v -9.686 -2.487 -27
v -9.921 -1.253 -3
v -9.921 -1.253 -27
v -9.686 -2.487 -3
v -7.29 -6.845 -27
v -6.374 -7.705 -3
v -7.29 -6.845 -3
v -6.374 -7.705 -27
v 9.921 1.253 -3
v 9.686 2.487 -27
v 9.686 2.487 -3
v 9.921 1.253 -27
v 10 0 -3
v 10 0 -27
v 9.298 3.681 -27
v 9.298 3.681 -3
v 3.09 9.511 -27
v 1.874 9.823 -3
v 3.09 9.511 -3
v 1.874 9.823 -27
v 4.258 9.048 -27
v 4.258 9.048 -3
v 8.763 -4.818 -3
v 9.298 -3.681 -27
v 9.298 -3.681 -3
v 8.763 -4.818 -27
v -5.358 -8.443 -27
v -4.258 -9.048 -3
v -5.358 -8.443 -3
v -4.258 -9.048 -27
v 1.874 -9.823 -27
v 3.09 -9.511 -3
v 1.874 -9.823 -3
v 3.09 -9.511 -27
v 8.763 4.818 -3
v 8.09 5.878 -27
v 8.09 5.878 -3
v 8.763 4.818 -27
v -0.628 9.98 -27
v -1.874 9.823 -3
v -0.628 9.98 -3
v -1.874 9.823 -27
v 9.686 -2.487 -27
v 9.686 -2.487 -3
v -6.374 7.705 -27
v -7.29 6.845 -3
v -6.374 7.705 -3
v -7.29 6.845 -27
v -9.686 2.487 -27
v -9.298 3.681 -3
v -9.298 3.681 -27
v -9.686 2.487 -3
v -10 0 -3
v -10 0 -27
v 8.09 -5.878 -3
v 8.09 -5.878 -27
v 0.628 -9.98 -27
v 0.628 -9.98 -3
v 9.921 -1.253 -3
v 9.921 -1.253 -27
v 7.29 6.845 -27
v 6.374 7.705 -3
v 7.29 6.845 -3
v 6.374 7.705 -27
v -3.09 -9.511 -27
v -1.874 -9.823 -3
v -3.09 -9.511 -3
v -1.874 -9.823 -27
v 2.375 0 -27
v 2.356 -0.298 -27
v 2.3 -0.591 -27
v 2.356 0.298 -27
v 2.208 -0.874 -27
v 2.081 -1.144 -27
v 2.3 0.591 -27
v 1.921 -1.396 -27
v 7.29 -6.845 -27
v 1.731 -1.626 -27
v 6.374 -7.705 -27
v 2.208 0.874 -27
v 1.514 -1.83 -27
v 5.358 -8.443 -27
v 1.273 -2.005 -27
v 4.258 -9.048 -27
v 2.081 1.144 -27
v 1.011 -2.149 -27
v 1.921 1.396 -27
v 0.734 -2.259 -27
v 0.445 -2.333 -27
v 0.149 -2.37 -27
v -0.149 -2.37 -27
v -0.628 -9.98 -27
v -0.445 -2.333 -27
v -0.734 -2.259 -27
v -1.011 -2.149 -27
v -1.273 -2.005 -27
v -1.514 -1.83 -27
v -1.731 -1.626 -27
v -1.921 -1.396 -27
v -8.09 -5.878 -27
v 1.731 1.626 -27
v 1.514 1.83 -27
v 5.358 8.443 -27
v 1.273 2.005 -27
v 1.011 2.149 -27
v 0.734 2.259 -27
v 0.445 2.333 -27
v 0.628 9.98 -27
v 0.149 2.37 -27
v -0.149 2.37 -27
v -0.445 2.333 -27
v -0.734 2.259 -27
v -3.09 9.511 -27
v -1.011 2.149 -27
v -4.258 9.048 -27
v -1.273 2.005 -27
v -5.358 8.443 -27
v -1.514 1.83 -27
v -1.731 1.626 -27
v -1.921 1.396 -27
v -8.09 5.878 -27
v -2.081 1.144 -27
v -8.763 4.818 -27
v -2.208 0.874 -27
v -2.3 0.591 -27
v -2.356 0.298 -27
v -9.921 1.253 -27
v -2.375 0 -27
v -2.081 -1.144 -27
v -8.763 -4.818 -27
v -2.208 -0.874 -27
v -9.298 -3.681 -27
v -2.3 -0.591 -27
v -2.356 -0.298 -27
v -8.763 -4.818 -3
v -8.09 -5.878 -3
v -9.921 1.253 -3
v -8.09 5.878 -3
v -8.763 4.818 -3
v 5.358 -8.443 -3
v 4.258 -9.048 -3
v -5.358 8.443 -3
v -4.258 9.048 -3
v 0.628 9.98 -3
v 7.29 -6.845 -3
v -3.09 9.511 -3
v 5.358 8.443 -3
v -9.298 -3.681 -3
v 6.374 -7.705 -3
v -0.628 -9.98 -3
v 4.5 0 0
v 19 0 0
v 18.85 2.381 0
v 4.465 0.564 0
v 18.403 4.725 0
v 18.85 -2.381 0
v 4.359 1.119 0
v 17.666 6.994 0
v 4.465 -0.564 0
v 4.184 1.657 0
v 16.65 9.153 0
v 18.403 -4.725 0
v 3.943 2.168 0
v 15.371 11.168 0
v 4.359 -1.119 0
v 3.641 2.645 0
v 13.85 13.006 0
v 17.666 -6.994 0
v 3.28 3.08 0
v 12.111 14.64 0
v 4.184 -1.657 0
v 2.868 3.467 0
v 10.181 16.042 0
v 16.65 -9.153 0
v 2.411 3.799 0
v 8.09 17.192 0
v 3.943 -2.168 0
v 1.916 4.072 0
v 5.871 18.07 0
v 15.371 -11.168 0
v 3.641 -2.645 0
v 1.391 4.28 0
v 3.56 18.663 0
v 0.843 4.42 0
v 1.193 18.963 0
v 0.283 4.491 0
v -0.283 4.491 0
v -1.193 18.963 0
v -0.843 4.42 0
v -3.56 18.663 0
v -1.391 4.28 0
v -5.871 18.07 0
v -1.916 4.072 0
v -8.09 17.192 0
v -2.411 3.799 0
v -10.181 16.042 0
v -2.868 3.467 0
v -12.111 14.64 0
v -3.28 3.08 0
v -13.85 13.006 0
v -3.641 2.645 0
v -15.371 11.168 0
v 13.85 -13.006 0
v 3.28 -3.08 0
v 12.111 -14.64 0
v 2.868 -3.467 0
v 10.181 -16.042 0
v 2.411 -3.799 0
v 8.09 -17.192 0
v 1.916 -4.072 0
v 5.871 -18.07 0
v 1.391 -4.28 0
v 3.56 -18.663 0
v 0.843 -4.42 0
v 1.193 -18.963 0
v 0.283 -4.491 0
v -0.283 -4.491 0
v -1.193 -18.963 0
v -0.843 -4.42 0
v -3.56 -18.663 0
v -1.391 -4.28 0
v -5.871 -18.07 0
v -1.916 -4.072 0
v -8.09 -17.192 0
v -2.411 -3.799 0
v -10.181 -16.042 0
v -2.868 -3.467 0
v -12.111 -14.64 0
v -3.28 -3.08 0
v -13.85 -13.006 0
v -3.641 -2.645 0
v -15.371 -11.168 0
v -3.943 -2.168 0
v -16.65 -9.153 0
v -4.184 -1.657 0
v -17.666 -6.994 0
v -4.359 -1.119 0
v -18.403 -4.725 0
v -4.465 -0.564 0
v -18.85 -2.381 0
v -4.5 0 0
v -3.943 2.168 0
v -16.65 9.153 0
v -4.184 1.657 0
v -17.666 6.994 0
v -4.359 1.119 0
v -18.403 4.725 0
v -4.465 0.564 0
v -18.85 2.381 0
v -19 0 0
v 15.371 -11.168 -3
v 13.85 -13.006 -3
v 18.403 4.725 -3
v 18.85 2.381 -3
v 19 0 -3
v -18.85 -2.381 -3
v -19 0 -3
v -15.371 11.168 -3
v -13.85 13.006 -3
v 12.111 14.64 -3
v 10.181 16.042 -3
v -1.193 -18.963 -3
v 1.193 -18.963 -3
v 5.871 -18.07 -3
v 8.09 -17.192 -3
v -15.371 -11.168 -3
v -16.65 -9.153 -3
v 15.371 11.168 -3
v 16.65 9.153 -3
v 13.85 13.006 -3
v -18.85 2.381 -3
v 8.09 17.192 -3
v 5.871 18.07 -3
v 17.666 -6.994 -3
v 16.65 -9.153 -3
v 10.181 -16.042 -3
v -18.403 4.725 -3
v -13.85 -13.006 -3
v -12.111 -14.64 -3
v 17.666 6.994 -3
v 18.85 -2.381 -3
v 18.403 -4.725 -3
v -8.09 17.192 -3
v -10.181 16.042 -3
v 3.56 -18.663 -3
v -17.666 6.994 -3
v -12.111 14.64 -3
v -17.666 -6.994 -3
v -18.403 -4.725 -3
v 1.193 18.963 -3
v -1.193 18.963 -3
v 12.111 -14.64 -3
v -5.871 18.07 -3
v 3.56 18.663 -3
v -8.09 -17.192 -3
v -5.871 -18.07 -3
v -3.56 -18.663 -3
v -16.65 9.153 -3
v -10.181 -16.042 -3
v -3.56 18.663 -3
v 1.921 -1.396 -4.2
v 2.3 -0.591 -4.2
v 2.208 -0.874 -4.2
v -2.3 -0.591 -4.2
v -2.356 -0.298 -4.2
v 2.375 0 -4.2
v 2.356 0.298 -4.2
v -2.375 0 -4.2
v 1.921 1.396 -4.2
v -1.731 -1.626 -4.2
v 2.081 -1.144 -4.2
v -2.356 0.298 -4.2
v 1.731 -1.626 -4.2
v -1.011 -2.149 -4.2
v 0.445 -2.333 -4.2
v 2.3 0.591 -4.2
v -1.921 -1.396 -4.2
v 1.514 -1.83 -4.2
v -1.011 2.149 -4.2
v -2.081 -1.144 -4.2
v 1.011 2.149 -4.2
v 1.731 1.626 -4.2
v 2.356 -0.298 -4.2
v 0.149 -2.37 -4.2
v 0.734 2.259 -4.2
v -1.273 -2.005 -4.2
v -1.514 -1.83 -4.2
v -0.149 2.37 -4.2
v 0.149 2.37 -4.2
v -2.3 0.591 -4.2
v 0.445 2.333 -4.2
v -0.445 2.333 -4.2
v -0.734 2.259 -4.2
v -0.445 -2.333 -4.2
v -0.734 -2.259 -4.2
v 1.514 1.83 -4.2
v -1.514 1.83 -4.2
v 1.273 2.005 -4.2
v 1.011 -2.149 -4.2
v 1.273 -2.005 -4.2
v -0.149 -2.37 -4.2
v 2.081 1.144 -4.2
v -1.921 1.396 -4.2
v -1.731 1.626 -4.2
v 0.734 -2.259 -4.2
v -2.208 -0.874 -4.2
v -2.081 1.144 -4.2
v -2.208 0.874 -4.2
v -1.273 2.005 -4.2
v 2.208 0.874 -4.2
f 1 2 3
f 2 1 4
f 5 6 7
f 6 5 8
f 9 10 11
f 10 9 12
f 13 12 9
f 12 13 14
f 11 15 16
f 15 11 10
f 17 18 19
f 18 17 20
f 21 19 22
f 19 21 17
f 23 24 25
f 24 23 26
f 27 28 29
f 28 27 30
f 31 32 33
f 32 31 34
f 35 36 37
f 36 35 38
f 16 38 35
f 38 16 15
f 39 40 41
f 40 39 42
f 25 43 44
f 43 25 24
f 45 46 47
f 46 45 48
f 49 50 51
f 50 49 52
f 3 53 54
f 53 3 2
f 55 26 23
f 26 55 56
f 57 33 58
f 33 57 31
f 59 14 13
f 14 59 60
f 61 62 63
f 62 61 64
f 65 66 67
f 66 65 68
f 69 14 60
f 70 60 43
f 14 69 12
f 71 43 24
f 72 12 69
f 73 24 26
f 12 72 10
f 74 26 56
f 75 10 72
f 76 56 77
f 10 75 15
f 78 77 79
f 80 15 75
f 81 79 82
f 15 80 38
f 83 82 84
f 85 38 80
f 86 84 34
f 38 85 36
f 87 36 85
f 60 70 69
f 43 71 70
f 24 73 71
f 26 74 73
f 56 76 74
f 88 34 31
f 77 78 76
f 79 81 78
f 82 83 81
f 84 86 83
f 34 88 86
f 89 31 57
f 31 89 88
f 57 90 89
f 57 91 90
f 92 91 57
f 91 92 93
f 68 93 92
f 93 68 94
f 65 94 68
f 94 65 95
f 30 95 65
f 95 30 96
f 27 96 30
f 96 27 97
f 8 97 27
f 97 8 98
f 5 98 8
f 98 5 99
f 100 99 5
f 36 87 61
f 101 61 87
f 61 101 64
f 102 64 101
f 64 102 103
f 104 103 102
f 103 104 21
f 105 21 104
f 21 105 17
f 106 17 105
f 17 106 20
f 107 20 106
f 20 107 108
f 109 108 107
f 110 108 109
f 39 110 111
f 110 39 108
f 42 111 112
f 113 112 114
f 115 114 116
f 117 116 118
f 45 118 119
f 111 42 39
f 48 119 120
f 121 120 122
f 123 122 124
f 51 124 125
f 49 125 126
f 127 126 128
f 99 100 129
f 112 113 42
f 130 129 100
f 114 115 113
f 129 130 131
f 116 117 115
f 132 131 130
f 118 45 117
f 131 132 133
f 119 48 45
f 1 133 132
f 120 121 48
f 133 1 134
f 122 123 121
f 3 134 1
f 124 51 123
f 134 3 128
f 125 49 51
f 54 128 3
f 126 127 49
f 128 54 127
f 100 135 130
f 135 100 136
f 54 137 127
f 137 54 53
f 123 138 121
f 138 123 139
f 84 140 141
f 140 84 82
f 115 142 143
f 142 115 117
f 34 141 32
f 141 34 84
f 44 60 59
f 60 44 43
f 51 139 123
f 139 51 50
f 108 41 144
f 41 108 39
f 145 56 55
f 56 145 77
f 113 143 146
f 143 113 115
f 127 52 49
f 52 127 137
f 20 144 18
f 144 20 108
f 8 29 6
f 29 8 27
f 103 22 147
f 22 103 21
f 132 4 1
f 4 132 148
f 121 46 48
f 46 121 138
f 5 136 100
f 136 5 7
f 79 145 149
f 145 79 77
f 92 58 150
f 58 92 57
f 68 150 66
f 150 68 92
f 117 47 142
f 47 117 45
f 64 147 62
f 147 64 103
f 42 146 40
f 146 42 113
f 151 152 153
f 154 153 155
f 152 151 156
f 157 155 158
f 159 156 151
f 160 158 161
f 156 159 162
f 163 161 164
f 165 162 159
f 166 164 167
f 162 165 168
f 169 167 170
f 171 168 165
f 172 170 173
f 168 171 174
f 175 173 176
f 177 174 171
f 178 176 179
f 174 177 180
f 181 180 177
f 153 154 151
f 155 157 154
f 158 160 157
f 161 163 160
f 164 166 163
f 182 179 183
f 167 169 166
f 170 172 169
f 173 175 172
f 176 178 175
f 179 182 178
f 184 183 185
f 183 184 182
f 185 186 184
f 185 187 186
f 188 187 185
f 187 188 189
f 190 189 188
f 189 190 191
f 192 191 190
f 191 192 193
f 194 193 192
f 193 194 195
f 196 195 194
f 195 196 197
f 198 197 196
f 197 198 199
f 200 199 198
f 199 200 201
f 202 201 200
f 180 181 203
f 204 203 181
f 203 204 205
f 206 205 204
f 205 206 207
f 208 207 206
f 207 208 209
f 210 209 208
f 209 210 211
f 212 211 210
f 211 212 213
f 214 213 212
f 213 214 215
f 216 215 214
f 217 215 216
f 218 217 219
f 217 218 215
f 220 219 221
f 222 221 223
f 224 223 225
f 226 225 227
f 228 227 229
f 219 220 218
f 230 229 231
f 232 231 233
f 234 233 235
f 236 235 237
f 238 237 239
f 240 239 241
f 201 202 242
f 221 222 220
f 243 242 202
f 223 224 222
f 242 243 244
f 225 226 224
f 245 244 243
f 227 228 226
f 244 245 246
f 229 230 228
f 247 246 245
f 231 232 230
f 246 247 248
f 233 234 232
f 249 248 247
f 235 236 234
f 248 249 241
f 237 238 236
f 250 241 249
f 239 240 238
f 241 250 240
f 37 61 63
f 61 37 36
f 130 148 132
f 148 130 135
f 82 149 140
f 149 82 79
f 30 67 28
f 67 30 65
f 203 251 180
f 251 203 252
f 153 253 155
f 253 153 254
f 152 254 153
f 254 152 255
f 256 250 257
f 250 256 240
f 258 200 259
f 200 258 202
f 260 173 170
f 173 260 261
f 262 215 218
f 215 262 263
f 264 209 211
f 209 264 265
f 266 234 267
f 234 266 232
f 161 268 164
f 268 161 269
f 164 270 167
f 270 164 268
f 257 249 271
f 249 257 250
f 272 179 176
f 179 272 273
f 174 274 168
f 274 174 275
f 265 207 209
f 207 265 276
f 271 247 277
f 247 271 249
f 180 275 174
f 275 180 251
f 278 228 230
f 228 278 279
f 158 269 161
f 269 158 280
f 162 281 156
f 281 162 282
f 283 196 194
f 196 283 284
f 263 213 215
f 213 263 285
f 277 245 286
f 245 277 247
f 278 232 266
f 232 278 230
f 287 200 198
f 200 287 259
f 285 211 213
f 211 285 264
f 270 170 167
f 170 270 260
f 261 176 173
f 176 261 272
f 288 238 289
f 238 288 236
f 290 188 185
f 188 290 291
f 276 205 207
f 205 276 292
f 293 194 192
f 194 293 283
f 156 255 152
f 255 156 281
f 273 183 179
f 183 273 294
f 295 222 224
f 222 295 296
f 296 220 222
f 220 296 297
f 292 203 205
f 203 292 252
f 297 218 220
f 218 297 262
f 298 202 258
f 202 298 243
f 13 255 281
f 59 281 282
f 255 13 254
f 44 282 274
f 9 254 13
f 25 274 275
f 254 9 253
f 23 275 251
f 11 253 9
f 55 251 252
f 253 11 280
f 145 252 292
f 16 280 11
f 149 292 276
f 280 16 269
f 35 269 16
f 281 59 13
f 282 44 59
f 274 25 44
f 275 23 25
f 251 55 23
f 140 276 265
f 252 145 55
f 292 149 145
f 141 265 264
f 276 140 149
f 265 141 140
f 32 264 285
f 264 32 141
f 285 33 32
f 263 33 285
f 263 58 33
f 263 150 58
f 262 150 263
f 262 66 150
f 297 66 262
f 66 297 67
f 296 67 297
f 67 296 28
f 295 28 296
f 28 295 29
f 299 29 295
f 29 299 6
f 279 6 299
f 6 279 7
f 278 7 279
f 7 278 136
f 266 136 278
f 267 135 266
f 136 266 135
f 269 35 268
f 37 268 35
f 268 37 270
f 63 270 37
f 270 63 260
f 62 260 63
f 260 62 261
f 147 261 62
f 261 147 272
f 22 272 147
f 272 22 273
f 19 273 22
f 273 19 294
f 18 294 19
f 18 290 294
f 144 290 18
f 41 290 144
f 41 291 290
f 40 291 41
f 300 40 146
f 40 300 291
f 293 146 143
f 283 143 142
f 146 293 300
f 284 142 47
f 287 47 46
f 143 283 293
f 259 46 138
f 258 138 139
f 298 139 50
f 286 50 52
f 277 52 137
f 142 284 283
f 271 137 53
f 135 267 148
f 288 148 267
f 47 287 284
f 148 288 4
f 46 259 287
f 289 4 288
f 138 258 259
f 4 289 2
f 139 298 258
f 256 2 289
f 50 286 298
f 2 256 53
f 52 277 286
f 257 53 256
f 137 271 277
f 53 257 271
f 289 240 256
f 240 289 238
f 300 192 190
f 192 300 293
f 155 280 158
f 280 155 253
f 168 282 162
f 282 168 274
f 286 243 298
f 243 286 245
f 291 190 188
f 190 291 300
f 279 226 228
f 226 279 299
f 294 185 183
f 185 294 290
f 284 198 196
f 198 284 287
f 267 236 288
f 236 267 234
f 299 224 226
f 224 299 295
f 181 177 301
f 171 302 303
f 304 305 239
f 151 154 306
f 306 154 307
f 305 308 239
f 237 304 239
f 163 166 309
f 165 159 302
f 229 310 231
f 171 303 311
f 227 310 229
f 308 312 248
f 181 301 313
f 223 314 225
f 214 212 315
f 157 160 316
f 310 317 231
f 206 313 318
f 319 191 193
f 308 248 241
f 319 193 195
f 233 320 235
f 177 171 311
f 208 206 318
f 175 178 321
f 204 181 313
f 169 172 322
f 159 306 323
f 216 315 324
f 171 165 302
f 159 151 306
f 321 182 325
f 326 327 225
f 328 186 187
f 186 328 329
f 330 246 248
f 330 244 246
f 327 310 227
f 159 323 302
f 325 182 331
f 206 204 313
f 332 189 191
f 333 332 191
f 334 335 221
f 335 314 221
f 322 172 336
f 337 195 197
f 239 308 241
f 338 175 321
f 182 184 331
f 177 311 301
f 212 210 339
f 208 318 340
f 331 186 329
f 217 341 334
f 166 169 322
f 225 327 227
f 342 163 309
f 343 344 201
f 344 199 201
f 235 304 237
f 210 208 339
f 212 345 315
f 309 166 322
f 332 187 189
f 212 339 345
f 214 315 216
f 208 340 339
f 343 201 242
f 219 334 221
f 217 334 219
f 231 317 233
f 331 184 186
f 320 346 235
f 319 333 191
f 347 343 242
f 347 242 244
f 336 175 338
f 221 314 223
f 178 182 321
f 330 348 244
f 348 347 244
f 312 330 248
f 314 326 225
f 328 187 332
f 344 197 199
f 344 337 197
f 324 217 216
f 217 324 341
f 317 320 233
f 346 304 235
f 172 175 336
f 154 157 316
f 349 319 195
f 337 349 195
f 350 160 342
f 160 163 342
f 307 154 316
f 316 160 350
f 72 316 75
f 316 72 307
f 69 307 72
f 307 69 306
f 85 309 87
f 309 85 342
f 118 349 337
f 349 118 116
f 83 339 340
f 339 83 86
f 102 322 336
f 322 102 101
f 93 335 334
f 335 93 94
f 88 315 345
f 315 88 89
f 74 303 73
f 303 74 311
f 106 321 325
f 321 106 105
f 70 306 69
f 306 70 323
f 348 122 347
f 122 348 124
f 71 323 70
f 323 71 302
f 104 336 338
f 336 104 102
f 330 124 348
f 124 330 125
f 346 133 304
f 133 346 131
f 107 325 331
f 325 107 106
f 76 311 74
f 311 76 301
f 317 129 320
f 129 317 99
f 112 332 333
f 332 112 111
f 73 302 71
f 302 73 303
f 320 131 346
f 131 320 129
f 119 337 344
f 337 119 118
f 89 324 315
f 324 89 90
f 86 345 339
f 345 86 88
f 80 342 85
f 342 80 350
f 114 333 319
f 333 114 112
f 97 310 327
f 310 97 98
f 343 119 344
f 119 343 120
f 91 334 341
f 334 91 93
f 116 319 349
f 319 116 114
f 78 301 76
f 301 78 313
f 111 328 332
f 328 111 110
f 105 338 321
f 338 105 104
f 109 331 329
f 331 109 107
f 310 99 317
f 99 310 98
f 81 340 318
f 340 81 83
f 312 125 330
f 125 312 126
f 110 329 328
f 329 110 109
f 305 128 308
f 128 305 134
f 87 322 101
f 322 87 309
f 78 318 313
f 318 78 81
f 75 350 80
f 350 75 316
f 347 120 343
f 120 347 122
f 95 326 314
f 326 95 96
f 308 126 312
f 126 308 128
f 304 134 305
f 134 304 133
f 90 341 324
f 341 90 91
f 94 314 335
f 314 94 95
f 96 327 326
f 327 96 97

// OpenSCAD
$fn = 50;


difference() {
	union() {
		translate(v = [0, 0, -27.0000000000]) {
			cylinder(h = 27, r = 10.0000000000);
		}
		translate(v = [0, 0, -3.0000000000]) {
			cylinder(h = 3, r = 19.0000000000);
		}
	}
	union() {
		translate(v = [0, 0, 0]) {
			rotate(a = [0, 0, 0]) {
				difference() {
					union() {
						#translate(v = [0, 0, -27.0000000000]) {
							cylinder(h = 27, r = 2.2500000000);
						}
						#translate(v = [0, 0, -4.2000000000]) {
							cylinder(h = 4.2000000000, r1 = 2.3750000000, r2 = 4.5000000000);
						}
						#translate(v = [0, 0, -27.0000000000]) {
							cylinder(h = 27, r = 2.3750000000);
						}
						#translate(v = [0, 0, -27.0000000000]) {
							cylinder(h = 27, r = 2.2500000000);
						}
					}
					union();
				}
			}
		}
	}
}
